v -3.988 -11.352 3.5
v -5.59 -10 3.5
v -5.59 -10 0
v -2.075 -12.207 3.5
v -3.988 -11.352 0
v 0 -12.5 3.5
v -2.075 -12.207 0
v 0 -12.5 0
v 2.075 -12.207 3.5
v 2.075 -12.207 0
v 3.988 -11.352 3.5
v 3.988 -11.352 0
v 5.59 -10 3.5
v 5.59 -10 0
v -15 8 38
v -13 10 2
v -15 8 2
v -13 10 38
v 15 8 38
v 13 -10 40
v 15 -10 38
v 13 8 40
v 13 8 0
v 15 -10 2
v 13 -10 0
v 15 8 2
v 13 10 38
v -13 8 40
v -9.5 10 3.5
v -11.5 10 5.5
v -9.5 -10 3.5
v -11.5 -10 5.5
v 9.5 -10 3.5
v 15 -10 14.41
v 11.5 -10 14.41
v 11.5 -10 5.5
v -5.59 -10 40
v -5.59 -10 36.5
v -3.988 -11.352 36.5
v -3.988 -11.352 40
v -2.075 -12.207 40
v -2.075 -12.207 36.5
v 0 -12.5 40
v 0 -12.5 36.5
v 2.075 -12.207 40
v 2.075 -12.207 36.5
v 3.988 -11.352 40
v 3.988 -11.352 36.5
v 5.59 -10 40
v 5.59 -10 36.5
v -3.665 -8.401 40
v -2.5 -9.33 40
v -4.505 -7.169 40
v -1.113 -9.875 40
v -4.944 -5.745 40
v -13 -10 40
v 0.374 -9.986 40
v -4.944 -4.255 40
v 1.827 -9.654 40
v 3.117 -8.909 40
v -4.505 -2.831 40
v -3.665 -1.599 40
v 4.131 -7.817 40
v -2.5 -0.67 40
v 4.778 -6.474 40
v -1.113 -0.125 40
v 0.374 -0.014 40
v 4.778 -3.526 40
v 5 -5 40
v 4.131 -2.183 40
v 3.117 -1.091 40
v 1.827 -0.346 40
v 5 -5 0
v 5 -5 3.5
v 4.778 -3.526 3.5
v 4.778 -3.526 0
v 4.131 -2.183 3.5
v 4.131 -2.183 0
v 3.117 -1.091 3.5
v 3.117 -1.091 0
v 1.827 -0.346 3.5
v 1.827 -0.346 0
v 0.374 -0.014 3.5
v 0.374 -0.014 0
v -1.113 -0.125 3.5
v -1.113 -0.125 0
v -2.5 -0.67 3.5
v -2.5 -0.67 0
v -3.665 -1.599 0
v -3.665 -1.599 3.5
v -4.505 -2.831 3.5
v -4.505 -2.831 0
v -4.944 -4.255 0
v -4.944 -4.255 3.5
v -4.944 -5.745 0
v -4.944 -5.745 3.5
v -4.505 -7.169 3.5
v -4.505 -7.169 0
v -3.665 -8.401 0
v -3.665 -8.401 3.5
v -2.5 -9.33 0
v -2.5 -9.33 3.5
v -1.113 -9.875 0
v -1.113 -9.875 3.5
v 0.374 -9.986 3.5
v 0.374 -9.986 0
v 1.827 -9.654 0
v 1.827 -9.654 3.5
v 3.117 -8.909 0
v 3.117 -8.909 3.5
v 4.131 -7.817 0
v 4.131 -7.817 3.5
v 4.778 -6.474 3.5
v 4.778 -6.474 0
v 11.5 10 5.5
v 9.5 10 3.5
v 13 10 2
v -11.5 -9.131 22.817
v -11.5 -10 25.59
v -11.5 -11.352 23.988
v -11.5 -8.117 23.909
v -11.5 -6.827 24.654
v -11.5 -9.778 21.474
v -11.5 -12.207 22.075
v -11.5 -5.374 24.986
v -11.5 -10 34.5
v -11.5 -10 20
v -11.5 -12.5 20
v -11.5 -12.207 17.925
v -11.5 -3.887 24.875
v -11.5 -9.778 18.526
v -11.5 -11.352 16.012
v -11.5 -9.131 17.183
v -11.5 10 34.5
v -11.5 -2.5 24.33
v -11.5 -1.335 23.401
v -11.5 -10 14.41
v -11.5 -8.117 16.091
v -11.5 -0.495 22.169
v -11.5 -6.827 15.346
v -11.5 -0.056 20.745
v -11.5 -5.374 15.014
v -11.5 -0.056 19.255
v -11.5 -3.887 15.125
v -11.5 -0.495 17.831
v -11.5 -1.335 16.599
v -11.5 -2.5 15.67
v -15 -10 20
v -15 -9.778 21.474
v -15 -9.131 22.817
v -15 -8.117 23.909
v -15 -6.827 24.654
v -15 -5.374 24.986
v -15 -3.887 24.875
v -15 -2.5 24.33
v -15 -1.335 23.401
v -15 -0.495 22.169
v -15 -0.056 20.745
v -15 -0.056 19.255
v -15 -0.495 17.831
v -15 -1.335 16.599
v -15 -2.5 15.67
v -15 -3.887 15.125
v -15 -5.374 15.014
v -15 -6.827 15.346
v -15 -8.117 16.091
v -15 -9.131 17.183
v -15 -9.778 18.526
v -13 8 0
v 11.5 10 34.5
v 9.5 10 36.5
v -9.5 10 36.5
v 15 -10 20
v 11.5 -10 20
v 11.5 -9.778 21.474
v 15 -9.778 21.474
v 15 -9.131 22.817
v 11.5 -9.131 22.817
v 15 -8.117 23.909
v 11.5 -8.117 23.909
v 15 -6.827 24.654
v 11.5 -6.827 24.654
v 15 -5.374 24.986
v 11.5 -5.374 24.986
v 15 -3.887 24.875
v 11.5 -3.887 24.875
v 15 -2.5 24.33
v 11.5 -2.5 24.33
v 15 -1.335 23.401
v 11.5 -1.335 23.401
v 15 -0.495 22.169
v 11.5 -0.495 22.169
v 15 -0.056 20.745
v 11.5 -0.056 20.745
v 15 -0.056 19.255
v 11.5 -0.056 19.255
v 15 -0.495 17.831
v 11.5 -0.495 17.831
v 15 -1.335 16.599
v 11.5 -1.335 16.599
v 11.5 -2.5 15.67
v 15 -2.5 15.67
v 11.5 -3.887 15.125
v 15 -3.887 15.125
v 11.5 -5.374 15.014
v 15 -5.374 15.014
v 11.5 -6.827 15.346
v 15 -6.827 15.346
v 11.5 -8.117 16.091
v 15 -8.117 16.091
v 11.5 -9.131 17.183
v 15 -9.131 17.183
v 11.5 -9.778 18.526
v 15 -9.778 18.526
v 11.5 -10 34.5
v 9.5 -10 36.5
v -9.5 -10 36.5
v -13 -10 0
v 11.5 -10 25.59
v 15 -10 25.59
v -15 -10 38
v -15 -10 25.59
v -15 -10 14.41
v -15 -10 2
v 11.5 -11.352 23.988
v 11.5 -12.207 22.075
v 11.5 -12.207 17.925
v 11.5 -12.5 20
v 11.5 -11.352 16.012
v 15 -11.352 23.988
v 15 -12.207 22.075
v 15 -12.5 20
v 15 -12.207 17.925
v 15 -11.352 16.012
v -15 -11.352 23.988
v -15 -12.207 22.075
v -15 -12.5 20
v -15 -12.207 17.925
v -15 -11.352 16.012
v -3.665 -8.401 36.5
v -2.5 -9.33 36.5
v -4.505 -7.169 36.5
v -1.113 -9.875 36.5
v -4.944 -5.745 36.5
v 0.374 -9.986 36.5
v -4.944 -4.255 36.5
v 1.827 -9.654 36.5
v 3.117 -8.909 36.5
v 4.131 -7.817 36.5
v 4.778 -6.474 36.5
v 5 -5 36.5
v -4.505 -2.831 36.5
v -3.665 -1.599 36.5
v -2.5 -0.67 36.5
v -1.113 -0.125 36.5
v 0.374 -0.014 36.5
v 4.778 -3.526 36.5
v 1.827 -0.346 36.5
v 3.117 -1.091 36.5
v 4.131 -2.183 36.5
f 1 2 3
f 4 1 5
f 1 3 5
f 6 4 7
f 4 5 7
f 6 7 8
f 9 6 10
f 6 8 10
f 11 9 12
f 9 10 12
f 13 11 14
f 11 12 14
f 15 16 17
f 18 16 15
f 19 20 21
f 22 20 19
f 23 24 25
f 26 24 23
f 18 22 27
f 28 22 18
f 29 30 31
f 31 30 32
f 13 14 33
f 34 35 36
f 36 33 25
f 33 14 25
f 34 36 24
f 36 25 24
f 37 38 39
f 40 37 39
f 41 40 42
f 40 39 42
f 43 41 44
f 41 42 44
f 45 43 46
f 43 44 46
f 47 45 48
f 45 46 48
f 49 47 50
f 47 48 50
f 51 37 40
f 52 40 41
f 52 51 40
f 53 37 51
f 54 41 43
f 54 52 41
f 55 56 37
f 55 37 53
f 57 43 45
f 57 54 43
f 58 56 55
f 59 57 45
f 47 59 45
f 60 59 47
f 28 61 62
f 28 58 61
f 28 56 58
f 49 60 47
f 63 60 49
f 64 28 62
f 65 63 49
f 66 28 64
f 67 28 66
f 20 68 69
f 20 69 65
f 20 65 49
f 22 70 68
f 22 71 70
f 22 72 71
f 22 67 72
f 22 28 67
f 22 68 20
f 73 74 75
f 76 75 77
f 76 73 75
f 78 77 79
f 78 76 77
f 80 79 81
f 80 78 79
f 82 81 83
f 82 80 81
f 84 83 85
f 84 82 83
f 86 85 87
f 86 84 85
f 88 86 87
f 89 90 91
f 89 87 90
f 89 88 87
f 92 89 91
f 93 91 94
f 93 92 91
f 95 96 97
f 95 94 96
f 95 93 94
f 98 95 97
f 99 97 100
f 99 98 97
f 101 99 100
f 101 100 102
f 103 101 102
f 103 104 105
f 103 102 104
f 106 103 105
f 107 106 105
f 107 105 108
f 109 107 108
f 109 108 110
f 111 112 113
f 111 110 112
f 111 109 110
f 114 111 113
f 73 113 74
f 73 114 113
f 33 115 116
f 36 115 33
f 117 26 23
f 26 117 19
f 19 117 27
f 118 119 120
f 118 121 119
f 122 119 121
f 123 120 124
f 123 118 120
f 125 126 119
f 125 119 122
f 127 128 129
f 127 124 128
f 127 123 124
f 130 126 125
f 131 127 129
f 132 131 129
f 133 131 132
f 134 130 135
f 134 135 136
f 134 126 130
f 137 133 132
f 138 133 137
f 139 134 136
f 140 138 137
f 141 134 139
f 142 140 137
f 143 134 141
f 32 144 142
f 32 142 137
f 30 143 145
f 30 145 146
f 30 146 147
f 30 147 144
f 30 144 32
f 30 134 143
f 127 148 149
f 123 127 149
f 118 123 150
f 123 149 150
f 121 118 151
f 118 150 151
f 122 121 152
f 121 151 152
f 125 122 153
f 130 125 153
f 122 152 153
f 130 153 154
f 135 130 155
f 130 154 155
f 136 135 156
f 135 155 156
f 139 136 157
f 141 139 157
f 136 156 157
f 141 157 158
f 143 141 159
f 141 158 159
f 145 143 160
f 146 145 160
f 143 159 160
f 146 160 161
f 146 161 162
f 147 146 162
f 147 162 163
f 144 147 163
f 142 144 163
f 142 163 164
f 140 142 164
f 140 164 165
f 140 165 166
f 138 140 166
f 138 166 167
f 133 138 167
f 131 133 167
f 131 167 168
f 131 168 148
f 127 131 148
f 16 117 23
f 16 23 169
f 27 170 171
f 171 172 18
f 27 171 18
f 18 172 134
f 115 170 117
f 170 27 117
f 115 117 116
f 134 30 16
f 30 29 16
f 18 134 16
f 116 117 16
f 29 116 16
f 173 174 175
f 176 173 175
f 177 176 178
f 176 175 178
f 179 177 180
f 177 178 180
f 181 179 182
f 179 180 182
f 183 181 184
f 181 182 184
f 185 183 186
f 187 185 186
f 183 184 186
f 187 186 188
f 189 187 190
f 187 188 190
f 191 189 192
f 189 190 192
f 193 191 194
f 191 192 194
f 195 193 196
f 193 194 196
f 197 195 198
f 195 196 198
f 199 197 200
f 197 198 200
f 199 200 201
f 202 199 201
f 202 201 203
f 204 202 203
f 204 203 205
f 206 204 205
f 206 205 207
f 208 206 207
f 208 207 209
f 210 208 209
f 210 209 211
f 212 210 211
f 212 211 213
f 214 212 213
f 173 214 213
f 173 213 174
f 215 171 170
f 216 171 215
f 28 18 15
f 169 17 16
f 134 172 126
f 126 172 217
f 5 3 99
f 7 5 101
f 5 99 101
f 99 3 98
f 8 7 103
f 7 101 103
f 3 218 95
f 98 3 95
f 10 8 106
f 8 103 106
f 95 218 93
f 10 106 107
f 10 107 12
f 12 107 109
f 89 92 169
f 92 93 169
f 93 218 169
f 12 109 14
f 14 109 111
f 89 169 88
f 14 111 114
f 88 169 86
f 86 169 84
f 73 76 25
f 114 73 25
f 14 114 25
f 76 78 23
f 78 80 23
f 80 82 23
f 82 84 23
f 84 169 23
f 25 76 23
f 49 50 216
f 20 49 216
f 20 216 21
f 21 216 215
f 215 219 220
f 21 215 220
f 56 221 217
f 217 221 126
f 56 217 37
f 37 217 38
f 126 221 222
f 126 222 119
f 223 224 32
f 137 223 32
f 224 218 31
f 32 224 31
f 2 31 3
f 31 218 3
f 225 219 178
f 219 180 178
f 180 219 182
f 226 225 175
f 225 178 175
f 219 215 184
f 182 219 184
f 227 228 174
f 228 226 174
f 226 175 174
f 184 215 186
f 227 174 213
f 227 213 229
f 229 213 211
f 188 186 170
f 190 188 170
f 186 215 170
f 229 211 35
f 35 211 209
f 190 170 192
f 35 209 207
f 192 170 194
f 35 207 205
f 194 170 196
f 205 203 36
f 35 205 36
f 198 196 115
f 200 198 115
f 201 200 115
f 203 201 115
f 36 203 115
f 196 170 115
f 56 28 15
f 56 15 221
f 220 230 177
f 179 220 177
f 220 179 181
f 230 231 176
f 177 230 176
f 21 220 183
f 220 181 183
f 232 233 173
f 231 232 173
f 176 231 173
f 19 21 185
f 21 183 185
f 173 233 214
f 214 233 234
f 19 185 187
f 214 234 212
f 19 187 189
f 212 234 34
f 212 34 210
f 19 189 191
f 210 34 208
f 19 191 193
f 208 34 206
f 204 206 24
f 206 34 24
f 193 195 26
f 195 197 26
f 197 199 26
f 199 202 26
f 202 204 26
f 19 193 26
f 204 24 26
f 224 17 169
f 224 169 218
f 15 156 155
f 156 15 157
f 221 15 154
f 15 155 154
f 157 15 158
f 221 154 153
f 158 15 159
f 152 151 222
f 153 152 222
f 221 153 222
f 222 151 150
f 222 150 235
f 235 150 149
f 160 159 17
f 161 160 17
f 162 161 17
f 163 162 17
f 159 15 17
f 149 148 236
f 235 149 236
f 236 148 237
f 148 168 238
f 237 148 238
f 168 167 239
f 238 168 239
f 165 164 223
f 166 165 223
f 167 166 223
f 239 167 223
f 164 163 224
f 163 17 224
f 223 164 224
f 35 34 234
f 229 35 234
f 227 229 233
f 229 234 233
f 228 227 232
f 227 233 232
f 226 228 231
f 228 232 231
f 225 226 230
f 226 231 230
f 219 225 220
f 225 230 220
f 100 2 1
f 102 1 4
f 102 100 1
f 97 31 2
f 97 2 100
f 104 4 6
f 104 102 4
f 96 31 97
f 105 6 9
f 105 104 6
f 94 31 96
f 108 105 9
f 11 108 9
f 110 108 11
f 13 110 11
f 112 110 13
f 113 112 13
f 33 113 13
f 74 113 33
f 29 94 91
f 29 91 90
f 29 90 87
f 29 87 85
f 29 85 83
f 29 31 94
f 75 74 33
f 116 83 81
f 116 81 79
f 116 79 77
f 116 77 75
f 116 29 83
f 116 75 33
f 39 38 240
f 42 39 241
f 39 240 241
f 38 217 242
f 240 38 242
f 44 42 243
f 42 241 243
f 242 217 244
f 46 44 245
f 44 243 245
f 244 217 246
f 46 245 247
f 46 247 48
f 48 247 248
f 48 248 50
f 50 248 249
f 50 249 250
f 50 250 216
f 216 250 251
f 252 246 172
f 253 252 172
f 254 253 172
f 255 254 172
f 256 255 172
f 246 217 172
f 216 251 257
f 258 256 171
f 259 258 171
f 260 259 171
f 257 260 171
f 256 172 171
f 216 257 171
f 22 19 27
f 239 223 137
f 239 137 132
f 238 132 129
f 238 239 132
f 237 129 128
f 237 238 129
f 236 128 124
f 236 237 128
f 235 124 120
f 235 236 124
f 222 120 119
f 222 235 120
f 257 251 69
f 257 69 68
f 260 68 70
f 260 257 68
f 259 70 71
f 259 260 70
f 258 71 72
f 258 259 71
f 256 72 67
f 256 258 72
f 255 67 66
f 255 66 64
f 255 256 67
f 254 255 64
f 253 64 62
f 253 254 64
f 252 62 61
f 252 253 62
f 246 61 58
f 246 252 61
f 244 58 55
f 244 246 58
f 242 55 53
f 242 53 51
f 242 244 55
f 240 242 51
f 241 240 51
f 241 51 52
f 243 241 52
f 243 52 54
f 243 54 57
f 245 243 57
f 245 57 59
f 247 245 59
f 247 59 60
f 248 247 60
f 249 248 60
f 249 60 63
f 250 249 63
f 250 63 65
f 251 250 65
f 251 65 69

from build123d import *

# Parameters (mm, degrees)
SKETCH1_R           = 5
BOSS_EXTRUDE1_DEPTH = 40
CUT_EXTRUDE1_REACH  = 50.283
SKETCH3_W           = 23
SKETCH3_H           = 33
BOSS_EXTRUDE2_DEPTH = 3.5
CHAMFER1_SIZE       = 2
SKETCH6_R           = 5
CUT_EXTRUDE8_DEPTH  = 52.53882032


with BuildPart() as part:
    # Sketch1 → Boss-Extrude1 (new body)
    with BuildSketch(Plane.XY):
        with BuildLine():
            ThreePointArc((-5.590169944, -10), (0, -12.5), (5.590169944, -10))
            Line((5.590169944, -10), (15, -10))
            Line((15, -10), (15, 10))
            Line((15, 10), (-15, 10))
            Line((-15, 10), (-15, -10))
            Line((-15, -10), (-5.590169944, -10))
        make_face()
        with Locations((0, -5)):
            Circle(SKETCH1_R, mode=Mode.SUBTRACT)
    extrude(amount=BOSS_EXTRUDE1_DEPTH)

    # Sketch3 → Cut-Extrude1 (cut, up to next)
    with BuildSketch(Plane(origin=(0, 10, 0), x_dir=(1, 0, 0), z_dir=(0, 1, 0)), mode=Mode.PRIVATE) as cut_extrude1_sk1:
        with Locations((0, -20)):
            Rectangle(SKETCH3_W, SKETCH3_H)
    cut_extrude1_tool1 = extrude(cut_extrude1_sk1.sketch, amount=-CUT_EXTRUDE1_REACH, mode=Mode.PRIVATE) & part.part
    add(cut_extrude1_tool1.solids().sort_by_distance((0, 10, 20))[0], mode=Mode.SUBTRACT)

    # Sketch4 → Boss-Extrude2 (add)
    with BuildSketch(Plane.ZY.offset(15)):
        with BuildLine():
            Line((25.590169944, -10), (14.409830056, -10))
            ThreePointArc((14.409830056, -10), (20, -12.5), (25.590169944, -10))
        make_face()
    boss_extrude2 = extrude(amount=-BOSS_EXTRUDE2_DEPTH)

    # Mirror1: Boss-Extrude2 across plane
    add(boss_extrude2.mirror(Plane(origin=(0, 0, 0), x_dir=(0, 0, 1), z_dir=(1, 0, 0))))

    # Chamfer1
    chamfer1_edges = [part.edges().sort_by_distance(p)[0] for p in [
        (15, 0, 0),
        (-15, 10, 20),
        (15, 10, 20),
        (15, 0, 40),
        (0, 10, 40),
        (-15, 0, 40),
        (-11.5, 0, 36.5),
        (-11.5, 0, 3.5),
        (11.5, 0, 3.5),
        (11.5, 0, 36.5),
        (-15, 0, 0),
        (0, 10, 0),
    ]]
    chamfer(chamfer1_edges, length=CHAMFER1_SIZE)

    # Sketch6 → Cut-Extrude8 (cut, through all)
    with BuildSketch(Plane.ZY.offset(15)):
        with Locations(Location((20, -5, 0), (0, 0, 270))):
            Circle(SKETCH6_R)
    extrude(amount=-CUT_EXTRUDE8_DEPTH, mode=Mode.SUBTRACT)


solid = part.part
